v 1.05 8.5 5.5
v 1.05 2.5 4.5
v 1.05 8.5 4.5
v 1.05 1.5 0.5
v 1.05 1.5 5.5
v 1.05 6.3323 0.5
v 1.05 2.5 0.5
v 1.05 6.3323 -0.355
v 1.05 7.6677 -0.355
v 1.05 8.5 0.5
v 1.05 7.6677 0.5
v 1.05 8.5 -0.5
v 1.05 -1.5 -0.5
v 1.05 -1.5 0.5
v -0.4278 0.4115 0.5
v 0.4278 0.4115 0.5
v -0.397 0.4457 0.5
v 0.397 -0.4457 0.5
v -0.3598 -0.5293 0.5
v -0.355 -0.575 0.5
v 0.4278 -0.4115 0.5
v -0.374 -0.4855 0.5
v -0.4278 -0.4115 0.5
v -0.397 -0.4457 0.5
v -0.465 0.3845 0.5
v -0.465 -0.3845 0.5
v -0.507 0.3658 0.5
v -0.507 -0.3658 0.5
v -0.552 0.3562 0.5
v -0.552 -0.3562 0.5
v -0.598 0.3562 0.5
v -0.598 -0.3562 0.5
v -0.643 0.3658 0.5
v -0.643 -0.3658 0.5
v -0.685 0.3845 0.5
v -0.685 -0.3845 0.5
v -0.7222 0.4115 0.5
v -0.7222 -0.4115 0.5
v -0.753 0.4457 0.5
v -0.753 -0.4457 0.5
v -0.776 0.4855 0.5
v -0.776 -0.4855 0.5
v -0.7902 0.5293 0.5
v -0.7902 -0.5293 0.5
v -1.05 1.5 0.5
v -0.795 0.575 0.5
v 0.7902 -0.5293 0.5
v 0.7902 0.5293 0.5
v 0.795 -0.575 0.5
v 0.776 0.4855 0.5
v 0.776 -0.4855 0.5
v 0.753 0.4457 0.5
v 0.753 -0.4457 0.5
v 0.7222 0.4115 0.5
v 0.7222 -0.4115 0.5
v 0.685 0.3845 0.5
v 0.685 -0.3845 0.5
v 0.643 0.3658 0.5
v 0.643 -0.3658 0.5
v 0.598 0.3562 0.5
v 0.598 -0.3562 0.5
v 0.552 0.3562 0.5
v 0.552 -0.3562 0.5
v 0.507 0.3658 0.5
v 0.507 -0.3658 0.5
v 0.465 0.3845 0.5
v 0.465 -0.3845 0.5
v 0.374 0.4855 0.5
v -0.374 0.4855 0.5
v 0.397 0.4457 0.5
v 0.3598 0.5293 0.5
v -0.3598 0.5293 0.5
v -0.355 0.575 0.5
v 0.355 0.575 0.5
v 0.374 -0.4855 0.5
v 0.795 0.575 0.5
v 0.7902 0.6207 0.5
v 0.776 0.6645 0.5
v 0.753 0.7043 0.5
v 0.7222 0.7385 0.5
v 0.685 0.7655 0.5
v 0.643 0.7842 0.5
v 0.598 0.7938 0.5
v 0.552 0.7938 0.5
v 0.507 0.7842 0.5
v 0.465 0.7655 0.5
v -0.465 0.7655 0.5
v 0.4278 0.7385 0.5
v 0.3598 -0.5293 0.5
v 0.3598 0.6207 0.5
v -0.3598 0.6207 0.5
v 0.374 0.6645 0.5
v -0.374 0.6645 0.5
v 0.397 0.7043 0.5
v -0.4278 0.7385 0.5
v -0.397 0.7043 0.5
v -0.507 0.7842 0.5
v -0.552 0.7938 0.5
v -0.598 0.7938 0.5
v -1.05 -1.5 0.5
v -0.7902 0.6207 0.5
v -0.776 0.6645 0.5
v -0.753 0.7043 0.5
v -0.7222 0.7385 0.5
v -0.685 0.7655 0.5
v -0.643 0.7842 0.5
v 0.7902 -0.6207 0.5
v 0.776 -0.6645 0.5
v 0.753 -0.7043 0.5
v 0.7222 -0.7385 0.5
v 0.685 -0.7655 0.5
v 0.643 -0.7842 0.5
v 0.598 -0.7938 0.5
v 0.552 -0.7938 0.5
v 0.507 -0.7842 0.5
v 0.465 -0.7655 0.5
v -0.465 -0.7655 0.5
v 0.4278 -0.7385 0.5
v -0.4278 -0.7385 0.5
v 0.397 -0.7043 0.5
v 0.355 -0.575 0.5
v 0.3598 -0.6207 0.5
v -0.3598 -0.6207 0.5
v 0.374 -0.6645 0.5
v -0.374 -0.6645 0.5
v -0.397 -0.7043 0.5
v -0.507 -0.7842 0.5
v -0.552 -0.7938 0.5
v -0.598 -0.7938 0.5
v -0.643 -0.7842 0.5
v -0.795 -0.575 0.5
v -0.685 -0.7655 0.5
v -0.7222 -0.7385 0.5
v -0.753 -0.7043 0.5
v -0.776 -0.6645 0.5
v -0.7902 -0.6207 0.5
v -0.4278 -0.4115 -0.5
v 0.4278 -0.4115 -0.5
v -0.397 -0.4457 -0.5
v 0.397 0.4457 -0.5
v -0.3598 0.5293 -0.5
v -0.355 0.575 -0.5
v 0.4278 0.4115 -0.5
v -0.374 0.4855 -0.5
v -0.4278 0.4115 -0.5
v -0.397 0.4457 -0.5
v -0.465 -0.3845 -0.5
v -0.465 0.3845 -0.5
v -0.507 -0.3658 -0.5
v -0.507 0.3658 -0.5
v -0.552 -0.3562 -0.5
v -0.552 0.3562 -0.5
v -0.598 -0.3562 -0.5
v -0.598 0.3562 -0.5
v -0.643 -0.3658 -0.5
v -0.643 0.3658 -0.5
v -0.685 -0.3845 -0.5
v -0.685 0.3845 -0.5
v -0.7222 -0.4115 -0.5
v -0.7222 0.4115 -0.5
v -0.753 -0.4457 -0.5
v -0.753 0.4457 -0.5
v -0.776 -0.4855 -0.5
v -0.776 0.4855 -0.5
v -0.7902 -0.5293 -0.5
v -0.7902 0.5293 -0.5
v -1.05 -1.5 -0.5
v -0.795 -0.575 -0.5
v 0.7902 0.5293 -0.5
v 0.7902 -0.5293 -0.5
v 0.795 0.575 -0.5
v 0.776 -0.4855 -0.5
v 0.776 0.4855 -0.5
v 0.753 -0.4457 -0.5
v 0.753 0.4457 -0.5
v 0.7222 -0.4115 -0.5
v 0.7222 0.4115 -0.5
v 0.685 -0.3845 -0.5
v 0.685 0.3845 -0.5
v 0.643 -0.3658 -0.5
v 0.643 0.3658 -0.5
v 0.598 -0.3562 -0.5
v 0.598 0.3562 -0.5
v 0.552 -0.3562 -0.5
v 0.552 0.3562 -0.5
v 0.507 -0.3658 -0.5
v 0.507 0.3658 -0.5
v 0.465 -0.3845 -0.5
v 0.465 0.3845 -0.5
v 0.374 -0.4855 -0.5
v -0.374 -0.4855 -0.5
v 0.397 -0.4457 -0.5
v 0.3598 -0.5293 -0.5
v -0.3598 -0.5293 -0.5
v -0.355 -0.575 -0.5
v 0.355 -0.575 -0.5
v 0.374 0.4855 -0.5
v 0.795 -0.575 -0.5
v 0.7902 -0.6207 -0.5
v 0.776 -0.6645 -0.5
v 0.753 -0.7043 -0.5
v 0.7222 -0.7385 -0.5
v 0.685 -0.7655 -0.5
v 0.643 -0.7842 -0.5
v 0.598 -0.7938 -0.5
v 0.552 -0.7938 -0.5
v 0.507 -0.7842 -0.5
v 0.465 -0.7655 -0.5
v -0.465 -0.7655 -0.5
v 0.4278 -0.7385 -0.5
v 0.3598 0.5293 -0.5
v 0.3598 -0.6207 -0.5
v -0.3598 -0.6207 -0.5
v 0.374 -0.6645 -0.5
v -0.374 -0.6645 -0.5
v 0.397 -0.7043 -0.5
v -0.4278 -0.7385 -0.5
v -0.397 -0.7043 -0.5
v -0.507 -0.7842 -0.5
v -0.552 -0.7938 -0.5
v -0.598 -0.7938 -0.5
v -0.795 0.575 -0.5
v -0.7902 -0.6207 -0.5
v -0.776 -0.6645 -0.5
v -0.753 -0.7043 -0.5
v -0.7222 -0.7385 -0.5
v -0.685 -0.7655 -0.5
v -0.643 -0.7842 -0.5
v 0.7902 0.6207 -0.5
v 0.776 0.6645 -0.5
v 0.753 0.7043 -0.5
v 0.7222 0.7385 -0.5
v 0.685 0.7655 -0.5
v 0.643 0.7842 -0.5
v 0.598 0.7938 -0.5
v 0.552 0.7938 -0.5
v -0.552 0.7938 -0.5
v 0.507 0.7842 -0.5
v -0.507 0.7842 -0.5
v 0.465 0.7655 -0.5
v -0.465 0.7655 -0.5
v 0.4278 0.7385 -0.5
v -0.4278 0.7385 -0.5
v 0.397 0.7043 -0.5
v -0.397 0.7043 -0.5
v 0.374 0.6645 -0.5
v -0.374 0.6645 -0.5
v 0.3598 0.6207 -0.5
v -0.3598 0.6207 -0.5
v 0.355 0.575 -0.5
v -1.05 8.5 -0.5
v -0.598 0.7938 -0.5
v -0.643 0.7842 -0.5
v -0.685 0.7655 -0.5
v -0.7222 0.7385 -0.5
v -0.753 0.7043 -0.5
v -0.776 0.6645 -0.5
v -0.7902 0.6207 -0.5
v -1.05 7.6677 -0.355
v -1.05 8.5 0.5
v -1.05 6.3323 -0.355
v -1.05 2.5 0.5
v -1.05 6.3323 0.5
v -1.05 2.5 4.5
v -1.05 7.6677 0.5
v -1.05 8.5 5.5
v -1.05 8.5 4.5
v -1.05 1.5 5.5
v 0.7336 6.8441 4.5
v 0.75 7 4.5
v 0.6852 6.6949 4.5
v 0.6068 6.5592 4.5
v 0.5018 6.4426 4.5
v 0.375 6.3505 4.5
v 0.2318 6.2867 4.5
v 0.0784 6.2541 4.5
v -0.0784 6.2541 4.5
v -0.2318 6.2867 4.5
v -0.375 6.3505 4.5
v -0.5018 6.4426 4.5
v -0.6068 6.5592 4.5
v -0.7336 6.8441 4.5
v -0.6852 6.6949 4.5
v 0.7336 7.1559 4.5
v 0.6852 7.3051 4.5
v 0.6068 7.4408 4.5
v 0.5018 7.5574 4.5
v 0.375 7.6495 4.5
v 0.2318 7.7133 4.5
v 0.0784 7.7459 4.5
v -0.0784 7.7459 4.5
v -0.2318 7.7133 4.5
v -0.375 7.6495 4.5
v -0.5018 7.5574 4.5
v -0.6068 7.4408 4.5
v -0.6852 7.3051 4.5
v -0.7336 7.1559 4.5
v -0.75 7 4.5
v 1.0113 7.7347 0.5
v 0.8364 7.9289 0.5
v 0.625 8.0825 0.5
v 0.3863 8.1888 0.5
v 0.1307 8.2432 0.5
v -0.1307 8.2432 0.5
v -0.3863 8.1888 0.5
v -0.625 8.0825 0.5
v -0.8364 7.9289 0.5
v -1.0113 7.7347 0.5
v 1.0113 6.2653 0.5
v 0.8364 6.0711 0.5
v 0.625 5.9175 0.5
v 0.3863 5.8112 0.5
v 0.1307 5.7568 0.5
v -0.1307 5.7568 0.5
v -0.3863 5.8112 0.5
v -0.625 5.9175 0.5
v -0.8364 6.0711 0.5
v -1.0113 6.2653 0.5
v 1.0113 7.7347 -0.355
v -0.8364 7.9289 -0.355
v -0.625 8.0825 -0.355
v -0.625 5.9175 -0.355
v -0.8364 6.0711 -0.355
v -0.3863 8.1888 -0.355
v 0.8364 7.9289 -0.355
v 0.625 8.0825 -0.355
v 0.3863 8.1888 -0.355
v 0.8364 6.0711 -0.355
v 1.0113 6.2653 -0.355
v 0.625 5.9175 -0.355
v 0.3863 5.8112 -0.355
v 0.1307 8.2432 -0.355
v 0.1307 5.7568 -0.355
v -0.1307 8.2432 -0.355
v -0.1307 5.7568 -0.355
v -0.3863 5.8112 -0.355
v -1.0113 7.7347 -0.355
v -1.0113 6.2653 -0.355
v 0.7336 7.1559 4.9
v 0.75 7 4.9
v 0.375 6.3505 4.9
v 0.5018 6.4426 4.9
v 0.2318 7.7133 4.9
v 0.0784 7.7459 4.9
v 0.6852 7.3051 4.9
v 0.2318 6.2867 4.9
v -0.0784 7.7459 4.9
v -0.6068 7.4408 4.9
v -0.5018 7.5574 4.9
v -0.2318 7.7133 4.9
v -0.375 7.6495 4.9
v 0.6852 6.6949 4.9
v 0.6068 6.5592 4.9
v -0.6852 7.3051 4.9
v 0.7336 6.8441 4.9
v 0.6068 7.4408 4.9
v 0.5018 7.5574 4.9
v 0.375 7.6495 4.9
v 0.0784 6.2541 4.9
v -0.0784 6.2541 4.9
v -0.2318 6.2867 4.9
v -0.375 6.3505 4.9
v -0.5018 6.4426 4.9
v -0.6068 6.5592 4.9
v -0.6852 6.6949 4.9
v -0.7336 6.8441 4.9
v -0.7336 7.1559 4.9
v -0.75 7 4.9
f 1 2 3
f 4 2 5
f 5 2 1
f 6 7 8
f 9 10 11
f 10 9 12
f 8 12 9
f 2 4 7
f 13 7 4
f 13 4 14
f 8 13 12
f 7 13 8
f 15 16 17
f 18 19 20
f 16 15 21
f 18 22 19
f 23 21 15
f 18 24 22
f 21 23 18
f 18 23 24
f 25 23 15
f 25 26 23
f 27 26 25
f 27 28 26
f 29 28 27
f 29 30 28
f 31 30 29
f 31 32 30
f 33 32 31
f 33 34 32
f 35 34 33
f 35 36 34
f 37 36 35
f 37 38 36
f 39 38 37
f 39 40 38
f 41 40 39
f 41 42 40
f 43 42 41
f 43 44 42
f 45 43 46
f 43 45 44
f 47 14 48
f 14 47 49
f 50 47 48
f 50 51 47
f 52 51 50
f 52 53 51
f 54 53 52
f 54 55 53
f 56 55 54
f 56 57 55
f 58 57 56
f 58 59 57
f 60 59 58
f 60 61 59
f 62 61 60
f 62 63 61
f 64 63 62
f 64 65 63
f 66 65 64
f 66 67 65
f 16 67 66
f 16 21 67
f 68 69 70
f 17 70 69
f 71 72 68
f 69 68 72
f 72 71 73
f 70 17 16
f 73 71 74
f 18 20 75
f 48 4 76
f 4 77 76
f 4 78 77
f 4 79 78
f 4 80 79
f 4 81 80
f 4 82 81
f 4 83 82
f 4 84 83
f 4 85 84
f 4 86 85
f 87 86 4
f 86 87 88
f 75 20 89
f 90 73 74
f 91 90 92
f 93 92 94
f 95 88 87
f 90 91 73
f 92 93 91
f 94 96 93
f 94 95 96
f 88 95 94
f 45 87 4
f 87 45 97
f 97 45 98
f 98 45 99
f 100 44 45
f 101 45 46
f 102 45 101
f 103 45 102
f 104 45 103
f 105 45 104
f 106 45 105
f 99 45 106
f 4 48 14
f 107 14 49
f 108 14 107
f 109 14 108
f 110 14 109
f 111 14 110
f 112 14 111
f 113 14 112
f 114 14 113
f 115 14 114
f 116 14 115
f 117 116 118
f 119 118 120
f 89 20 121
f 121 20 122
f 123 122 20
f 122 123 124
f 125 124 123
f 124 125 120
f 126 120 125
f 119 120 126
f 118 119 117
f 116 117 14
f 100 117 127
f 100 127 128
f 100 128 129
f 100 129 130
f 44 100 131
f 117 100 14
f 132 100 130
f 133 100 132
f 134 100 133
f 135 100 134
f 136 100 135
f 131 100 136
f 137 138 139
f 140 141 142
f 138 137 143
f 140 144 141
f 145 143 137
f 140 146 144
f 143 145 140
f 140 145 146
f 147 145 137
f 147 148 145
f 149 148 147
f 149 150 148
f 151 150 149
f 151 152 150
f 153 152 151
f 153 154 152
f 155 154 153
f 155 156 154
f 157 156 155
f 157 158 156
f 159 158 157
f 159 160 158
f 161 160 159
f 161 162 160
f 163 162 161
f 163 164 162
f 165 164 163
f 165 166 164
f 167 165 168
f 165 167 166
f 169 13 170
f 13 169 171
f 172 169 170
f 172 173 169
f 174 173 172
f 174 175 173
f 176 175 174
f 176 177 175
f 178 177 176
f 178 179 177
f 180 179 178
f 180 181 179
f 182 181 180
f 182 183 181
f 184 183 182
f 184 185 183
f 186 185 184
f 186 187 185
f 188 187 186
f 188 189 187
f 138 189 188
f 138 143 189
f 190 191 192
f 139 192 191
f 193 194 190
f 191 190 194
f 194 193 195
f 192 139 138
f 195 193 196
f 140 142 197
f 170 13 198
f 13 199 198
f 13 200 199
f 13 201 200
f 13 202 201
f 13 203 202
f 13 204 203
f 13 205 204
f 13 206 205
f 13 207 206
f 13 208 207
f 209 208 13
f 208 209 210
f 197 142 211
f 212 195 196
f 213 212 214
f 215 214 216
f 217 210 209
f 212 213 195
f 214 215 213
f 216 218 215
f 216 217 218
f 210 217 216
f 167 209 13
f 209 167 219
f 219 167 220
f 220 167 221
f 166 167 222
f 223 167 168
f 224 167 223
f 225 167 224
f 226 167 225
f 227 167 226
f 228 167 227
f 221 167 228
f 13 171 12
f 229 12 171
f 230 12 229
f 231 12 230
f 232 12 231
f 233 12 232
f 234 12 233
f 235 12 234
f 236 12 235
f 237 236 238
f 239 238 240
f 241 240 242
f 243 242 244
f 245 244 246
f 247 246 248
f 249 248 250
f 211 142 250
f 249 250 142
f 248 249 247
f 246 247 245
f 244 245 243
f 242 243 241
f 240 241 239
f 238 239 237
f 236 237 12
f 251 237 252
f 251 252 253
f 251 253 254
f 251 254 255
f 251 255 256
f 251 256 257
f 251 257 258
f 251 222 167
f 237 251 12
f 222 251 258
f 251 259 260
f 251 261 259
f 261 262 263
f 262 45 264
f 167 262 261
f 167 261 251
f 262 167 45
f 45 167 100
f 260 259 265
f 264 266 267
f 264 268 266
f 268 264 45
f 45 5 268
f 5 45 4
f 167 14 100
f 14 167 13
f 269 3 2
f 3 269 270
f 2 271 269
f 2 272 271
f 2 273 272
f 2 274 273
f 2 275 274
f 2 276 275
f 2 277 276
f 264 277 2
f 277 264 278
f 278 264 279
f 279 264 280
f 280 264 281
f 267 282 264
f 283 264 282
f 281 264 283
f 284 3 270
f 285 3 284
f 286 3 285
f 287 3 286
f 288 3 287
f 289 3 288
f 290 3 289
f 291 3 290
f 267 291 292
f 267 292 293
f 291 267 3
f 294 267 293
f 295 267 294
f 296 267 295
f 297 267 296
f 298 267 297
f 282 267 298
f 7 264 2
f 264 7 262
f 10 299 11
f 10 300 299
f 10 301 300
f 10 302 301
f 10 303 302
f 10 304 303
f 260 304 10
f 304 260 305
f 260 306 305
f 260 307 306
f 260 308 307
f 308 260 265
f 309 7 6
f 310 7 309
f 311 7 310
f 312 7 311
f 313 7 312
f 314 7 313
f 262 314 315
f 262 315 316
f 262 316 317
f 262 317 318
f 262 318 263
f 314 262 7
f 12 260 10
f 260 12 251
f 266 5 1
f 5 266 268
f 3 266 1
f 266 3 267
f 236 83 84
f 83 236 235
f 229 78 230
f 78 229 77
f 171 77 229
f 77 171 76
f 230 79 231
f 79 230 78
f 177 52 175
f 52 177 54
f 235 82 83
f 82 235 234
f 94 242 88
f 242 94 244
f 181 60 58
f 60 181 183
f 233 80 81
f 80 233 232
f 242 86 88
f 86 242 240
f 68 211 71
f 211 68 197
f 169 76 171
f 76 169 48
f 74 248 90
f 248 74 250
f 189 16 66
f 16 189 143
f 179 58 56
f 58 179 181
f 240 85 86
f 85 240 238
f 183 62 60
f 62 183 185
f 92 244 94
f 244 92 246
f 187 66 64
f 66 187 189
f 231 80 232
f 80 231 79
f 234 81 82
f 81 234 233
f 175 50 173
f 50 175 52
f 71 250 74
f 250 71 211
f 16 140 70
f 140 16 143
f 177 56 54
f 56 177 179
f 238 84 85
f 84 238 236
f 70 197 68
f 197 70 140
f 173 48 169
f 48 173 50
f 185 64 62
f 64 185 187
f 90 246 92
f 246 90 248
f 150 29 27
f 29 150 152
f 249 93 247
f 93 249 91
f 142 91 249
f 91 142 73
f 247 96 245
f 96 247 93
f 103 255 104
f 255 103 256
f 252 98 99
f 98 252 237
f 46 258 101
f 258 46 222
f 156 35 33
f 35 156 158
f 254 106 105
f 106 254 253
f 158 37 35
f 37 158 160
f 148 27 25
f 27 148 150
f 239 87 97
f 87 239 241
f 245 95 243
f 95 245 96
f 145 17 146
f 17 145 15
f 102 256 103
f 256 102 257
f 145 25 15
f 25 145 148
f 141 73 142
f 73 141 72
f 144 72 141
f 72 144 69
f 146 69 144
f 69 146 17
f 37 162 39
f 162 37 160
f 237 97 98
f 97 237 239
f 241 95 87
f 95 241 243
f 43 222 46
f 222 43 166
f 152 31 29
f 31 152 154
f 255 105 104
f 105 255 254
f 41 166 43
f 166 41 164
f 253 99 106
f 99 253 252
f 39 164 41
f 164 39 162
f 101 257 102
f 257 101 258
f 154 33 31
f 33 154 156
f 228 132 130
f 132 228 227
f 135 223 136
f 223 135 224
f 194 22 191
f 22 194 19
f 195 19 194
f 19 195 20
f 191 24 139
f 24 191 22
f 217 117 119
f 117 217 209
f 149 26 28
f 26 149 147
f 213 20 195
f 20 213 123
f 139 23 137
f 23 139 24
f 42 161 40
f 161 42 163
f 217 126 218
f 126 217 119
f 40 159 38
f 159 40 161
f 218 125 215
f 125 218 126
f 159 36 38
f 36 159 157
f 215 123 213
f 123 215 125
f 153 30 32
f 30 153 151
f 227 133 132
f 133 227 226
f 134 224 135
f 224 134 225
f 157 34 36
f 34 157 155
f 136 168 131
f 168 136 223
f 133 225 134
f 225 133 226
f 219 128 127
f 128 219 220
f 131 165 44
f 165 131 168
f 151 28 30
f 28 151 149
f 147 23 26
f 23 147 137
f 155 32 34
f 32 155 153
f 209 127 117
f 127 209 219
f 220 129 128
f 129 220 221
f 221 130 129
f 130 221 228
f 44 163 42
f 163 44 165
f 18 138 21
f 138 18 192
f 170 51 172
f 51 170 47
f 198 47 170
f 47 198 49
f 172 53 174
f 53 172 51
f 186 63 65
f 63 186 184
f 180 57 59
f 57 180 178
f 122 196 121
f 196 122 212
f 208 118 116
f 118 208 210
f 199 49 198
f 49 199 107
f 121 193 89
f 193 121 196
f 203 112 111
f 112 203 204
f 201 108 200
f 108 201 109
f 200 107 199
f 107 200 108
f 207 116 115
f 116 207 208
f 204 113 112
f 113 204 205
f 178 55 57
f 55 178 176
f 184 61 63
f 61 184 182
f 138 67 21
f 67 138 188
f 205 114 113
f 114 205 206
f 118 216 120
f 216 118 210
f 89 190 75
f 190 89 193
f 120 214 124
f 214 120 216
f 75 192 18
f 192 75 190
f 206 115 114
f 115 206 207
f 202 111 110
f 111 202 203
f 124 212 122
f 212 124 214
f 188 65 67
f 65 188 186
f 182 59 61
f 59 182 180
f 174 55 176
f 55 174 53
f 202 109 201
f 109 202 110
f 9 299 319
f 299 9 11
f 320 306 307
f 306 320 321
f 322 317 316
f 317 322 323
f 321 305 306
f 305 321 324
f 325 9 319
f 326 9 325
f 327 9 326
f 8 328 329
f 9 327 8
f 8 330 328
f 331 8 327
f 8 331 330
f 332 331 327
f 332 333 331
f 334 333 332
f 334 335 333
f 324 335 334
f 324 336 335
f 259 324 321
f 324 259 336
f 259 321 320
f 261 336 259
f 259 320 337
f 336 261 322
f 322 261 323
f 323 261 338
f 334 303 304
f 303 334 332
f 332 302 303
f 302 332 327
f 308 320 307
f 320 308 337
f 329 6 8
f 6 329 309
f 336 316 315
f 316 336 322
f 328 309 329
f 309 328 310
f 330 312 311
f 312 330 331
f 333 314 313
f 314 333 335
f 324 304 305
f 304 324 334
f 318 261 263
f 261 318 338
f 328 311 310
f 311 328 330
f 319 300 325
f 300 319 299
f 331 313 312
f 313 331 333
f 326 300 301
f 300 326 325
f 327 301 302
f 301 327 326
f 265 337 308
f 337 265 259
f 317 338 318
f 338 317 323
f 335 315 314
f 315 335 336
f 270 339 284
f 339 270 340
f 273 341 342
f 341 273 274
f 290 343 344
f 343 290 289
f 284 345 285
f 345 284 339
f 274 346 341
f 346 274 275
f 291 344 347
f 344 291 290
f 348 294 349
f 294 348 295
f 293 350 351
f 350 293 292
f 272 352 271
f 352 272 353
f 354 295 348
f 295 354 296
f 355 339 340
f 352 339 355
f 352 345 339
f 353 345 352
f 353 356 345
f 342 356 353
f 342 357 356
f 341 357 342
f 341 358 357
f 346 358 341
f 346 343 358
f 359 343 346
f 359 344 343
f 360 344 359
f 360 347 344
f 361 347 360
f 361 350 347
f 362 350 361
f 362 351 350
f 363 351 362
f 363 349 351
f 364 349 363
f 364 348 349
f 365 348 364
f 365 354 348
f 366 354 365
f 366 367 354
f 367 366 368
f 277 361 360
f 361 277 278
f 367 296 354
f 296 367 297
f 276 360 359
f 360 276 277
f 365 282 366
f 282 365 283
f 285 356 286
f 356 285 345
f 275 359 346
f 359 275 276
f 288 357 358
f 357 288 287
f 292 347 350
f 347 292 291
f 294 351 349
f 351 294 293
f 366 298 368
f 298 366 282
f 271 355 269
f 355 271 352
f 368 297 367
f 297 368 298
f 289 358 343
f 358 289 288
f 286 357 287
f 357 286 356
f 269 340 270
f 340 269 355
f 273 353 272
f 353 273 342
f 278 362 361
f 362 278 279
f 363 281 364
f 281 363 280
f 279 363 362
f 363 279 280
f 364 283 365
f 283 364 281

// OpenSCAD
$fn = 30;
module holes() {
	fudge_room = 0.04;
	translate([1.15/2, 1.15/2, 0]) cylinder(d=0.4 + fudge_room, h=4, center=true);
	translate([-1.15/2, 1.15/2, 0]) cylinder(d=0.4 + fudge_room, h=4, center=true);
	translate([-1.15/2, -1.15/2, 0]) cylinder(d=0.4 + fudge_room, h=4, center=true);
	translate([1.15/2, -1.15/2, 0]) cylinder(d=0.4 + fudge_room, h=4, center=true);
}

module elbow() {
	difference() {
		union() {
			cube([2.1, 3, 1], center=true);
			translate([0,2,4/2]) cube([2.1, 1, 5], center=true);
			translate([0,(3+6)/2 + 1,0])cube([2.1, 6, 1], center=true);
			translate([0,(3+6+1)/2 ,5])cube([2.1, 7, 1], center=true);
		}
		holes();
		translate([0, 7, 0.08]) cylinder(d=2.5, h=0.87, center=true);
		translate([0, 7, 4.4]) cylinder(d=1.5, h=1, center=true);
	}
}

elbow();
